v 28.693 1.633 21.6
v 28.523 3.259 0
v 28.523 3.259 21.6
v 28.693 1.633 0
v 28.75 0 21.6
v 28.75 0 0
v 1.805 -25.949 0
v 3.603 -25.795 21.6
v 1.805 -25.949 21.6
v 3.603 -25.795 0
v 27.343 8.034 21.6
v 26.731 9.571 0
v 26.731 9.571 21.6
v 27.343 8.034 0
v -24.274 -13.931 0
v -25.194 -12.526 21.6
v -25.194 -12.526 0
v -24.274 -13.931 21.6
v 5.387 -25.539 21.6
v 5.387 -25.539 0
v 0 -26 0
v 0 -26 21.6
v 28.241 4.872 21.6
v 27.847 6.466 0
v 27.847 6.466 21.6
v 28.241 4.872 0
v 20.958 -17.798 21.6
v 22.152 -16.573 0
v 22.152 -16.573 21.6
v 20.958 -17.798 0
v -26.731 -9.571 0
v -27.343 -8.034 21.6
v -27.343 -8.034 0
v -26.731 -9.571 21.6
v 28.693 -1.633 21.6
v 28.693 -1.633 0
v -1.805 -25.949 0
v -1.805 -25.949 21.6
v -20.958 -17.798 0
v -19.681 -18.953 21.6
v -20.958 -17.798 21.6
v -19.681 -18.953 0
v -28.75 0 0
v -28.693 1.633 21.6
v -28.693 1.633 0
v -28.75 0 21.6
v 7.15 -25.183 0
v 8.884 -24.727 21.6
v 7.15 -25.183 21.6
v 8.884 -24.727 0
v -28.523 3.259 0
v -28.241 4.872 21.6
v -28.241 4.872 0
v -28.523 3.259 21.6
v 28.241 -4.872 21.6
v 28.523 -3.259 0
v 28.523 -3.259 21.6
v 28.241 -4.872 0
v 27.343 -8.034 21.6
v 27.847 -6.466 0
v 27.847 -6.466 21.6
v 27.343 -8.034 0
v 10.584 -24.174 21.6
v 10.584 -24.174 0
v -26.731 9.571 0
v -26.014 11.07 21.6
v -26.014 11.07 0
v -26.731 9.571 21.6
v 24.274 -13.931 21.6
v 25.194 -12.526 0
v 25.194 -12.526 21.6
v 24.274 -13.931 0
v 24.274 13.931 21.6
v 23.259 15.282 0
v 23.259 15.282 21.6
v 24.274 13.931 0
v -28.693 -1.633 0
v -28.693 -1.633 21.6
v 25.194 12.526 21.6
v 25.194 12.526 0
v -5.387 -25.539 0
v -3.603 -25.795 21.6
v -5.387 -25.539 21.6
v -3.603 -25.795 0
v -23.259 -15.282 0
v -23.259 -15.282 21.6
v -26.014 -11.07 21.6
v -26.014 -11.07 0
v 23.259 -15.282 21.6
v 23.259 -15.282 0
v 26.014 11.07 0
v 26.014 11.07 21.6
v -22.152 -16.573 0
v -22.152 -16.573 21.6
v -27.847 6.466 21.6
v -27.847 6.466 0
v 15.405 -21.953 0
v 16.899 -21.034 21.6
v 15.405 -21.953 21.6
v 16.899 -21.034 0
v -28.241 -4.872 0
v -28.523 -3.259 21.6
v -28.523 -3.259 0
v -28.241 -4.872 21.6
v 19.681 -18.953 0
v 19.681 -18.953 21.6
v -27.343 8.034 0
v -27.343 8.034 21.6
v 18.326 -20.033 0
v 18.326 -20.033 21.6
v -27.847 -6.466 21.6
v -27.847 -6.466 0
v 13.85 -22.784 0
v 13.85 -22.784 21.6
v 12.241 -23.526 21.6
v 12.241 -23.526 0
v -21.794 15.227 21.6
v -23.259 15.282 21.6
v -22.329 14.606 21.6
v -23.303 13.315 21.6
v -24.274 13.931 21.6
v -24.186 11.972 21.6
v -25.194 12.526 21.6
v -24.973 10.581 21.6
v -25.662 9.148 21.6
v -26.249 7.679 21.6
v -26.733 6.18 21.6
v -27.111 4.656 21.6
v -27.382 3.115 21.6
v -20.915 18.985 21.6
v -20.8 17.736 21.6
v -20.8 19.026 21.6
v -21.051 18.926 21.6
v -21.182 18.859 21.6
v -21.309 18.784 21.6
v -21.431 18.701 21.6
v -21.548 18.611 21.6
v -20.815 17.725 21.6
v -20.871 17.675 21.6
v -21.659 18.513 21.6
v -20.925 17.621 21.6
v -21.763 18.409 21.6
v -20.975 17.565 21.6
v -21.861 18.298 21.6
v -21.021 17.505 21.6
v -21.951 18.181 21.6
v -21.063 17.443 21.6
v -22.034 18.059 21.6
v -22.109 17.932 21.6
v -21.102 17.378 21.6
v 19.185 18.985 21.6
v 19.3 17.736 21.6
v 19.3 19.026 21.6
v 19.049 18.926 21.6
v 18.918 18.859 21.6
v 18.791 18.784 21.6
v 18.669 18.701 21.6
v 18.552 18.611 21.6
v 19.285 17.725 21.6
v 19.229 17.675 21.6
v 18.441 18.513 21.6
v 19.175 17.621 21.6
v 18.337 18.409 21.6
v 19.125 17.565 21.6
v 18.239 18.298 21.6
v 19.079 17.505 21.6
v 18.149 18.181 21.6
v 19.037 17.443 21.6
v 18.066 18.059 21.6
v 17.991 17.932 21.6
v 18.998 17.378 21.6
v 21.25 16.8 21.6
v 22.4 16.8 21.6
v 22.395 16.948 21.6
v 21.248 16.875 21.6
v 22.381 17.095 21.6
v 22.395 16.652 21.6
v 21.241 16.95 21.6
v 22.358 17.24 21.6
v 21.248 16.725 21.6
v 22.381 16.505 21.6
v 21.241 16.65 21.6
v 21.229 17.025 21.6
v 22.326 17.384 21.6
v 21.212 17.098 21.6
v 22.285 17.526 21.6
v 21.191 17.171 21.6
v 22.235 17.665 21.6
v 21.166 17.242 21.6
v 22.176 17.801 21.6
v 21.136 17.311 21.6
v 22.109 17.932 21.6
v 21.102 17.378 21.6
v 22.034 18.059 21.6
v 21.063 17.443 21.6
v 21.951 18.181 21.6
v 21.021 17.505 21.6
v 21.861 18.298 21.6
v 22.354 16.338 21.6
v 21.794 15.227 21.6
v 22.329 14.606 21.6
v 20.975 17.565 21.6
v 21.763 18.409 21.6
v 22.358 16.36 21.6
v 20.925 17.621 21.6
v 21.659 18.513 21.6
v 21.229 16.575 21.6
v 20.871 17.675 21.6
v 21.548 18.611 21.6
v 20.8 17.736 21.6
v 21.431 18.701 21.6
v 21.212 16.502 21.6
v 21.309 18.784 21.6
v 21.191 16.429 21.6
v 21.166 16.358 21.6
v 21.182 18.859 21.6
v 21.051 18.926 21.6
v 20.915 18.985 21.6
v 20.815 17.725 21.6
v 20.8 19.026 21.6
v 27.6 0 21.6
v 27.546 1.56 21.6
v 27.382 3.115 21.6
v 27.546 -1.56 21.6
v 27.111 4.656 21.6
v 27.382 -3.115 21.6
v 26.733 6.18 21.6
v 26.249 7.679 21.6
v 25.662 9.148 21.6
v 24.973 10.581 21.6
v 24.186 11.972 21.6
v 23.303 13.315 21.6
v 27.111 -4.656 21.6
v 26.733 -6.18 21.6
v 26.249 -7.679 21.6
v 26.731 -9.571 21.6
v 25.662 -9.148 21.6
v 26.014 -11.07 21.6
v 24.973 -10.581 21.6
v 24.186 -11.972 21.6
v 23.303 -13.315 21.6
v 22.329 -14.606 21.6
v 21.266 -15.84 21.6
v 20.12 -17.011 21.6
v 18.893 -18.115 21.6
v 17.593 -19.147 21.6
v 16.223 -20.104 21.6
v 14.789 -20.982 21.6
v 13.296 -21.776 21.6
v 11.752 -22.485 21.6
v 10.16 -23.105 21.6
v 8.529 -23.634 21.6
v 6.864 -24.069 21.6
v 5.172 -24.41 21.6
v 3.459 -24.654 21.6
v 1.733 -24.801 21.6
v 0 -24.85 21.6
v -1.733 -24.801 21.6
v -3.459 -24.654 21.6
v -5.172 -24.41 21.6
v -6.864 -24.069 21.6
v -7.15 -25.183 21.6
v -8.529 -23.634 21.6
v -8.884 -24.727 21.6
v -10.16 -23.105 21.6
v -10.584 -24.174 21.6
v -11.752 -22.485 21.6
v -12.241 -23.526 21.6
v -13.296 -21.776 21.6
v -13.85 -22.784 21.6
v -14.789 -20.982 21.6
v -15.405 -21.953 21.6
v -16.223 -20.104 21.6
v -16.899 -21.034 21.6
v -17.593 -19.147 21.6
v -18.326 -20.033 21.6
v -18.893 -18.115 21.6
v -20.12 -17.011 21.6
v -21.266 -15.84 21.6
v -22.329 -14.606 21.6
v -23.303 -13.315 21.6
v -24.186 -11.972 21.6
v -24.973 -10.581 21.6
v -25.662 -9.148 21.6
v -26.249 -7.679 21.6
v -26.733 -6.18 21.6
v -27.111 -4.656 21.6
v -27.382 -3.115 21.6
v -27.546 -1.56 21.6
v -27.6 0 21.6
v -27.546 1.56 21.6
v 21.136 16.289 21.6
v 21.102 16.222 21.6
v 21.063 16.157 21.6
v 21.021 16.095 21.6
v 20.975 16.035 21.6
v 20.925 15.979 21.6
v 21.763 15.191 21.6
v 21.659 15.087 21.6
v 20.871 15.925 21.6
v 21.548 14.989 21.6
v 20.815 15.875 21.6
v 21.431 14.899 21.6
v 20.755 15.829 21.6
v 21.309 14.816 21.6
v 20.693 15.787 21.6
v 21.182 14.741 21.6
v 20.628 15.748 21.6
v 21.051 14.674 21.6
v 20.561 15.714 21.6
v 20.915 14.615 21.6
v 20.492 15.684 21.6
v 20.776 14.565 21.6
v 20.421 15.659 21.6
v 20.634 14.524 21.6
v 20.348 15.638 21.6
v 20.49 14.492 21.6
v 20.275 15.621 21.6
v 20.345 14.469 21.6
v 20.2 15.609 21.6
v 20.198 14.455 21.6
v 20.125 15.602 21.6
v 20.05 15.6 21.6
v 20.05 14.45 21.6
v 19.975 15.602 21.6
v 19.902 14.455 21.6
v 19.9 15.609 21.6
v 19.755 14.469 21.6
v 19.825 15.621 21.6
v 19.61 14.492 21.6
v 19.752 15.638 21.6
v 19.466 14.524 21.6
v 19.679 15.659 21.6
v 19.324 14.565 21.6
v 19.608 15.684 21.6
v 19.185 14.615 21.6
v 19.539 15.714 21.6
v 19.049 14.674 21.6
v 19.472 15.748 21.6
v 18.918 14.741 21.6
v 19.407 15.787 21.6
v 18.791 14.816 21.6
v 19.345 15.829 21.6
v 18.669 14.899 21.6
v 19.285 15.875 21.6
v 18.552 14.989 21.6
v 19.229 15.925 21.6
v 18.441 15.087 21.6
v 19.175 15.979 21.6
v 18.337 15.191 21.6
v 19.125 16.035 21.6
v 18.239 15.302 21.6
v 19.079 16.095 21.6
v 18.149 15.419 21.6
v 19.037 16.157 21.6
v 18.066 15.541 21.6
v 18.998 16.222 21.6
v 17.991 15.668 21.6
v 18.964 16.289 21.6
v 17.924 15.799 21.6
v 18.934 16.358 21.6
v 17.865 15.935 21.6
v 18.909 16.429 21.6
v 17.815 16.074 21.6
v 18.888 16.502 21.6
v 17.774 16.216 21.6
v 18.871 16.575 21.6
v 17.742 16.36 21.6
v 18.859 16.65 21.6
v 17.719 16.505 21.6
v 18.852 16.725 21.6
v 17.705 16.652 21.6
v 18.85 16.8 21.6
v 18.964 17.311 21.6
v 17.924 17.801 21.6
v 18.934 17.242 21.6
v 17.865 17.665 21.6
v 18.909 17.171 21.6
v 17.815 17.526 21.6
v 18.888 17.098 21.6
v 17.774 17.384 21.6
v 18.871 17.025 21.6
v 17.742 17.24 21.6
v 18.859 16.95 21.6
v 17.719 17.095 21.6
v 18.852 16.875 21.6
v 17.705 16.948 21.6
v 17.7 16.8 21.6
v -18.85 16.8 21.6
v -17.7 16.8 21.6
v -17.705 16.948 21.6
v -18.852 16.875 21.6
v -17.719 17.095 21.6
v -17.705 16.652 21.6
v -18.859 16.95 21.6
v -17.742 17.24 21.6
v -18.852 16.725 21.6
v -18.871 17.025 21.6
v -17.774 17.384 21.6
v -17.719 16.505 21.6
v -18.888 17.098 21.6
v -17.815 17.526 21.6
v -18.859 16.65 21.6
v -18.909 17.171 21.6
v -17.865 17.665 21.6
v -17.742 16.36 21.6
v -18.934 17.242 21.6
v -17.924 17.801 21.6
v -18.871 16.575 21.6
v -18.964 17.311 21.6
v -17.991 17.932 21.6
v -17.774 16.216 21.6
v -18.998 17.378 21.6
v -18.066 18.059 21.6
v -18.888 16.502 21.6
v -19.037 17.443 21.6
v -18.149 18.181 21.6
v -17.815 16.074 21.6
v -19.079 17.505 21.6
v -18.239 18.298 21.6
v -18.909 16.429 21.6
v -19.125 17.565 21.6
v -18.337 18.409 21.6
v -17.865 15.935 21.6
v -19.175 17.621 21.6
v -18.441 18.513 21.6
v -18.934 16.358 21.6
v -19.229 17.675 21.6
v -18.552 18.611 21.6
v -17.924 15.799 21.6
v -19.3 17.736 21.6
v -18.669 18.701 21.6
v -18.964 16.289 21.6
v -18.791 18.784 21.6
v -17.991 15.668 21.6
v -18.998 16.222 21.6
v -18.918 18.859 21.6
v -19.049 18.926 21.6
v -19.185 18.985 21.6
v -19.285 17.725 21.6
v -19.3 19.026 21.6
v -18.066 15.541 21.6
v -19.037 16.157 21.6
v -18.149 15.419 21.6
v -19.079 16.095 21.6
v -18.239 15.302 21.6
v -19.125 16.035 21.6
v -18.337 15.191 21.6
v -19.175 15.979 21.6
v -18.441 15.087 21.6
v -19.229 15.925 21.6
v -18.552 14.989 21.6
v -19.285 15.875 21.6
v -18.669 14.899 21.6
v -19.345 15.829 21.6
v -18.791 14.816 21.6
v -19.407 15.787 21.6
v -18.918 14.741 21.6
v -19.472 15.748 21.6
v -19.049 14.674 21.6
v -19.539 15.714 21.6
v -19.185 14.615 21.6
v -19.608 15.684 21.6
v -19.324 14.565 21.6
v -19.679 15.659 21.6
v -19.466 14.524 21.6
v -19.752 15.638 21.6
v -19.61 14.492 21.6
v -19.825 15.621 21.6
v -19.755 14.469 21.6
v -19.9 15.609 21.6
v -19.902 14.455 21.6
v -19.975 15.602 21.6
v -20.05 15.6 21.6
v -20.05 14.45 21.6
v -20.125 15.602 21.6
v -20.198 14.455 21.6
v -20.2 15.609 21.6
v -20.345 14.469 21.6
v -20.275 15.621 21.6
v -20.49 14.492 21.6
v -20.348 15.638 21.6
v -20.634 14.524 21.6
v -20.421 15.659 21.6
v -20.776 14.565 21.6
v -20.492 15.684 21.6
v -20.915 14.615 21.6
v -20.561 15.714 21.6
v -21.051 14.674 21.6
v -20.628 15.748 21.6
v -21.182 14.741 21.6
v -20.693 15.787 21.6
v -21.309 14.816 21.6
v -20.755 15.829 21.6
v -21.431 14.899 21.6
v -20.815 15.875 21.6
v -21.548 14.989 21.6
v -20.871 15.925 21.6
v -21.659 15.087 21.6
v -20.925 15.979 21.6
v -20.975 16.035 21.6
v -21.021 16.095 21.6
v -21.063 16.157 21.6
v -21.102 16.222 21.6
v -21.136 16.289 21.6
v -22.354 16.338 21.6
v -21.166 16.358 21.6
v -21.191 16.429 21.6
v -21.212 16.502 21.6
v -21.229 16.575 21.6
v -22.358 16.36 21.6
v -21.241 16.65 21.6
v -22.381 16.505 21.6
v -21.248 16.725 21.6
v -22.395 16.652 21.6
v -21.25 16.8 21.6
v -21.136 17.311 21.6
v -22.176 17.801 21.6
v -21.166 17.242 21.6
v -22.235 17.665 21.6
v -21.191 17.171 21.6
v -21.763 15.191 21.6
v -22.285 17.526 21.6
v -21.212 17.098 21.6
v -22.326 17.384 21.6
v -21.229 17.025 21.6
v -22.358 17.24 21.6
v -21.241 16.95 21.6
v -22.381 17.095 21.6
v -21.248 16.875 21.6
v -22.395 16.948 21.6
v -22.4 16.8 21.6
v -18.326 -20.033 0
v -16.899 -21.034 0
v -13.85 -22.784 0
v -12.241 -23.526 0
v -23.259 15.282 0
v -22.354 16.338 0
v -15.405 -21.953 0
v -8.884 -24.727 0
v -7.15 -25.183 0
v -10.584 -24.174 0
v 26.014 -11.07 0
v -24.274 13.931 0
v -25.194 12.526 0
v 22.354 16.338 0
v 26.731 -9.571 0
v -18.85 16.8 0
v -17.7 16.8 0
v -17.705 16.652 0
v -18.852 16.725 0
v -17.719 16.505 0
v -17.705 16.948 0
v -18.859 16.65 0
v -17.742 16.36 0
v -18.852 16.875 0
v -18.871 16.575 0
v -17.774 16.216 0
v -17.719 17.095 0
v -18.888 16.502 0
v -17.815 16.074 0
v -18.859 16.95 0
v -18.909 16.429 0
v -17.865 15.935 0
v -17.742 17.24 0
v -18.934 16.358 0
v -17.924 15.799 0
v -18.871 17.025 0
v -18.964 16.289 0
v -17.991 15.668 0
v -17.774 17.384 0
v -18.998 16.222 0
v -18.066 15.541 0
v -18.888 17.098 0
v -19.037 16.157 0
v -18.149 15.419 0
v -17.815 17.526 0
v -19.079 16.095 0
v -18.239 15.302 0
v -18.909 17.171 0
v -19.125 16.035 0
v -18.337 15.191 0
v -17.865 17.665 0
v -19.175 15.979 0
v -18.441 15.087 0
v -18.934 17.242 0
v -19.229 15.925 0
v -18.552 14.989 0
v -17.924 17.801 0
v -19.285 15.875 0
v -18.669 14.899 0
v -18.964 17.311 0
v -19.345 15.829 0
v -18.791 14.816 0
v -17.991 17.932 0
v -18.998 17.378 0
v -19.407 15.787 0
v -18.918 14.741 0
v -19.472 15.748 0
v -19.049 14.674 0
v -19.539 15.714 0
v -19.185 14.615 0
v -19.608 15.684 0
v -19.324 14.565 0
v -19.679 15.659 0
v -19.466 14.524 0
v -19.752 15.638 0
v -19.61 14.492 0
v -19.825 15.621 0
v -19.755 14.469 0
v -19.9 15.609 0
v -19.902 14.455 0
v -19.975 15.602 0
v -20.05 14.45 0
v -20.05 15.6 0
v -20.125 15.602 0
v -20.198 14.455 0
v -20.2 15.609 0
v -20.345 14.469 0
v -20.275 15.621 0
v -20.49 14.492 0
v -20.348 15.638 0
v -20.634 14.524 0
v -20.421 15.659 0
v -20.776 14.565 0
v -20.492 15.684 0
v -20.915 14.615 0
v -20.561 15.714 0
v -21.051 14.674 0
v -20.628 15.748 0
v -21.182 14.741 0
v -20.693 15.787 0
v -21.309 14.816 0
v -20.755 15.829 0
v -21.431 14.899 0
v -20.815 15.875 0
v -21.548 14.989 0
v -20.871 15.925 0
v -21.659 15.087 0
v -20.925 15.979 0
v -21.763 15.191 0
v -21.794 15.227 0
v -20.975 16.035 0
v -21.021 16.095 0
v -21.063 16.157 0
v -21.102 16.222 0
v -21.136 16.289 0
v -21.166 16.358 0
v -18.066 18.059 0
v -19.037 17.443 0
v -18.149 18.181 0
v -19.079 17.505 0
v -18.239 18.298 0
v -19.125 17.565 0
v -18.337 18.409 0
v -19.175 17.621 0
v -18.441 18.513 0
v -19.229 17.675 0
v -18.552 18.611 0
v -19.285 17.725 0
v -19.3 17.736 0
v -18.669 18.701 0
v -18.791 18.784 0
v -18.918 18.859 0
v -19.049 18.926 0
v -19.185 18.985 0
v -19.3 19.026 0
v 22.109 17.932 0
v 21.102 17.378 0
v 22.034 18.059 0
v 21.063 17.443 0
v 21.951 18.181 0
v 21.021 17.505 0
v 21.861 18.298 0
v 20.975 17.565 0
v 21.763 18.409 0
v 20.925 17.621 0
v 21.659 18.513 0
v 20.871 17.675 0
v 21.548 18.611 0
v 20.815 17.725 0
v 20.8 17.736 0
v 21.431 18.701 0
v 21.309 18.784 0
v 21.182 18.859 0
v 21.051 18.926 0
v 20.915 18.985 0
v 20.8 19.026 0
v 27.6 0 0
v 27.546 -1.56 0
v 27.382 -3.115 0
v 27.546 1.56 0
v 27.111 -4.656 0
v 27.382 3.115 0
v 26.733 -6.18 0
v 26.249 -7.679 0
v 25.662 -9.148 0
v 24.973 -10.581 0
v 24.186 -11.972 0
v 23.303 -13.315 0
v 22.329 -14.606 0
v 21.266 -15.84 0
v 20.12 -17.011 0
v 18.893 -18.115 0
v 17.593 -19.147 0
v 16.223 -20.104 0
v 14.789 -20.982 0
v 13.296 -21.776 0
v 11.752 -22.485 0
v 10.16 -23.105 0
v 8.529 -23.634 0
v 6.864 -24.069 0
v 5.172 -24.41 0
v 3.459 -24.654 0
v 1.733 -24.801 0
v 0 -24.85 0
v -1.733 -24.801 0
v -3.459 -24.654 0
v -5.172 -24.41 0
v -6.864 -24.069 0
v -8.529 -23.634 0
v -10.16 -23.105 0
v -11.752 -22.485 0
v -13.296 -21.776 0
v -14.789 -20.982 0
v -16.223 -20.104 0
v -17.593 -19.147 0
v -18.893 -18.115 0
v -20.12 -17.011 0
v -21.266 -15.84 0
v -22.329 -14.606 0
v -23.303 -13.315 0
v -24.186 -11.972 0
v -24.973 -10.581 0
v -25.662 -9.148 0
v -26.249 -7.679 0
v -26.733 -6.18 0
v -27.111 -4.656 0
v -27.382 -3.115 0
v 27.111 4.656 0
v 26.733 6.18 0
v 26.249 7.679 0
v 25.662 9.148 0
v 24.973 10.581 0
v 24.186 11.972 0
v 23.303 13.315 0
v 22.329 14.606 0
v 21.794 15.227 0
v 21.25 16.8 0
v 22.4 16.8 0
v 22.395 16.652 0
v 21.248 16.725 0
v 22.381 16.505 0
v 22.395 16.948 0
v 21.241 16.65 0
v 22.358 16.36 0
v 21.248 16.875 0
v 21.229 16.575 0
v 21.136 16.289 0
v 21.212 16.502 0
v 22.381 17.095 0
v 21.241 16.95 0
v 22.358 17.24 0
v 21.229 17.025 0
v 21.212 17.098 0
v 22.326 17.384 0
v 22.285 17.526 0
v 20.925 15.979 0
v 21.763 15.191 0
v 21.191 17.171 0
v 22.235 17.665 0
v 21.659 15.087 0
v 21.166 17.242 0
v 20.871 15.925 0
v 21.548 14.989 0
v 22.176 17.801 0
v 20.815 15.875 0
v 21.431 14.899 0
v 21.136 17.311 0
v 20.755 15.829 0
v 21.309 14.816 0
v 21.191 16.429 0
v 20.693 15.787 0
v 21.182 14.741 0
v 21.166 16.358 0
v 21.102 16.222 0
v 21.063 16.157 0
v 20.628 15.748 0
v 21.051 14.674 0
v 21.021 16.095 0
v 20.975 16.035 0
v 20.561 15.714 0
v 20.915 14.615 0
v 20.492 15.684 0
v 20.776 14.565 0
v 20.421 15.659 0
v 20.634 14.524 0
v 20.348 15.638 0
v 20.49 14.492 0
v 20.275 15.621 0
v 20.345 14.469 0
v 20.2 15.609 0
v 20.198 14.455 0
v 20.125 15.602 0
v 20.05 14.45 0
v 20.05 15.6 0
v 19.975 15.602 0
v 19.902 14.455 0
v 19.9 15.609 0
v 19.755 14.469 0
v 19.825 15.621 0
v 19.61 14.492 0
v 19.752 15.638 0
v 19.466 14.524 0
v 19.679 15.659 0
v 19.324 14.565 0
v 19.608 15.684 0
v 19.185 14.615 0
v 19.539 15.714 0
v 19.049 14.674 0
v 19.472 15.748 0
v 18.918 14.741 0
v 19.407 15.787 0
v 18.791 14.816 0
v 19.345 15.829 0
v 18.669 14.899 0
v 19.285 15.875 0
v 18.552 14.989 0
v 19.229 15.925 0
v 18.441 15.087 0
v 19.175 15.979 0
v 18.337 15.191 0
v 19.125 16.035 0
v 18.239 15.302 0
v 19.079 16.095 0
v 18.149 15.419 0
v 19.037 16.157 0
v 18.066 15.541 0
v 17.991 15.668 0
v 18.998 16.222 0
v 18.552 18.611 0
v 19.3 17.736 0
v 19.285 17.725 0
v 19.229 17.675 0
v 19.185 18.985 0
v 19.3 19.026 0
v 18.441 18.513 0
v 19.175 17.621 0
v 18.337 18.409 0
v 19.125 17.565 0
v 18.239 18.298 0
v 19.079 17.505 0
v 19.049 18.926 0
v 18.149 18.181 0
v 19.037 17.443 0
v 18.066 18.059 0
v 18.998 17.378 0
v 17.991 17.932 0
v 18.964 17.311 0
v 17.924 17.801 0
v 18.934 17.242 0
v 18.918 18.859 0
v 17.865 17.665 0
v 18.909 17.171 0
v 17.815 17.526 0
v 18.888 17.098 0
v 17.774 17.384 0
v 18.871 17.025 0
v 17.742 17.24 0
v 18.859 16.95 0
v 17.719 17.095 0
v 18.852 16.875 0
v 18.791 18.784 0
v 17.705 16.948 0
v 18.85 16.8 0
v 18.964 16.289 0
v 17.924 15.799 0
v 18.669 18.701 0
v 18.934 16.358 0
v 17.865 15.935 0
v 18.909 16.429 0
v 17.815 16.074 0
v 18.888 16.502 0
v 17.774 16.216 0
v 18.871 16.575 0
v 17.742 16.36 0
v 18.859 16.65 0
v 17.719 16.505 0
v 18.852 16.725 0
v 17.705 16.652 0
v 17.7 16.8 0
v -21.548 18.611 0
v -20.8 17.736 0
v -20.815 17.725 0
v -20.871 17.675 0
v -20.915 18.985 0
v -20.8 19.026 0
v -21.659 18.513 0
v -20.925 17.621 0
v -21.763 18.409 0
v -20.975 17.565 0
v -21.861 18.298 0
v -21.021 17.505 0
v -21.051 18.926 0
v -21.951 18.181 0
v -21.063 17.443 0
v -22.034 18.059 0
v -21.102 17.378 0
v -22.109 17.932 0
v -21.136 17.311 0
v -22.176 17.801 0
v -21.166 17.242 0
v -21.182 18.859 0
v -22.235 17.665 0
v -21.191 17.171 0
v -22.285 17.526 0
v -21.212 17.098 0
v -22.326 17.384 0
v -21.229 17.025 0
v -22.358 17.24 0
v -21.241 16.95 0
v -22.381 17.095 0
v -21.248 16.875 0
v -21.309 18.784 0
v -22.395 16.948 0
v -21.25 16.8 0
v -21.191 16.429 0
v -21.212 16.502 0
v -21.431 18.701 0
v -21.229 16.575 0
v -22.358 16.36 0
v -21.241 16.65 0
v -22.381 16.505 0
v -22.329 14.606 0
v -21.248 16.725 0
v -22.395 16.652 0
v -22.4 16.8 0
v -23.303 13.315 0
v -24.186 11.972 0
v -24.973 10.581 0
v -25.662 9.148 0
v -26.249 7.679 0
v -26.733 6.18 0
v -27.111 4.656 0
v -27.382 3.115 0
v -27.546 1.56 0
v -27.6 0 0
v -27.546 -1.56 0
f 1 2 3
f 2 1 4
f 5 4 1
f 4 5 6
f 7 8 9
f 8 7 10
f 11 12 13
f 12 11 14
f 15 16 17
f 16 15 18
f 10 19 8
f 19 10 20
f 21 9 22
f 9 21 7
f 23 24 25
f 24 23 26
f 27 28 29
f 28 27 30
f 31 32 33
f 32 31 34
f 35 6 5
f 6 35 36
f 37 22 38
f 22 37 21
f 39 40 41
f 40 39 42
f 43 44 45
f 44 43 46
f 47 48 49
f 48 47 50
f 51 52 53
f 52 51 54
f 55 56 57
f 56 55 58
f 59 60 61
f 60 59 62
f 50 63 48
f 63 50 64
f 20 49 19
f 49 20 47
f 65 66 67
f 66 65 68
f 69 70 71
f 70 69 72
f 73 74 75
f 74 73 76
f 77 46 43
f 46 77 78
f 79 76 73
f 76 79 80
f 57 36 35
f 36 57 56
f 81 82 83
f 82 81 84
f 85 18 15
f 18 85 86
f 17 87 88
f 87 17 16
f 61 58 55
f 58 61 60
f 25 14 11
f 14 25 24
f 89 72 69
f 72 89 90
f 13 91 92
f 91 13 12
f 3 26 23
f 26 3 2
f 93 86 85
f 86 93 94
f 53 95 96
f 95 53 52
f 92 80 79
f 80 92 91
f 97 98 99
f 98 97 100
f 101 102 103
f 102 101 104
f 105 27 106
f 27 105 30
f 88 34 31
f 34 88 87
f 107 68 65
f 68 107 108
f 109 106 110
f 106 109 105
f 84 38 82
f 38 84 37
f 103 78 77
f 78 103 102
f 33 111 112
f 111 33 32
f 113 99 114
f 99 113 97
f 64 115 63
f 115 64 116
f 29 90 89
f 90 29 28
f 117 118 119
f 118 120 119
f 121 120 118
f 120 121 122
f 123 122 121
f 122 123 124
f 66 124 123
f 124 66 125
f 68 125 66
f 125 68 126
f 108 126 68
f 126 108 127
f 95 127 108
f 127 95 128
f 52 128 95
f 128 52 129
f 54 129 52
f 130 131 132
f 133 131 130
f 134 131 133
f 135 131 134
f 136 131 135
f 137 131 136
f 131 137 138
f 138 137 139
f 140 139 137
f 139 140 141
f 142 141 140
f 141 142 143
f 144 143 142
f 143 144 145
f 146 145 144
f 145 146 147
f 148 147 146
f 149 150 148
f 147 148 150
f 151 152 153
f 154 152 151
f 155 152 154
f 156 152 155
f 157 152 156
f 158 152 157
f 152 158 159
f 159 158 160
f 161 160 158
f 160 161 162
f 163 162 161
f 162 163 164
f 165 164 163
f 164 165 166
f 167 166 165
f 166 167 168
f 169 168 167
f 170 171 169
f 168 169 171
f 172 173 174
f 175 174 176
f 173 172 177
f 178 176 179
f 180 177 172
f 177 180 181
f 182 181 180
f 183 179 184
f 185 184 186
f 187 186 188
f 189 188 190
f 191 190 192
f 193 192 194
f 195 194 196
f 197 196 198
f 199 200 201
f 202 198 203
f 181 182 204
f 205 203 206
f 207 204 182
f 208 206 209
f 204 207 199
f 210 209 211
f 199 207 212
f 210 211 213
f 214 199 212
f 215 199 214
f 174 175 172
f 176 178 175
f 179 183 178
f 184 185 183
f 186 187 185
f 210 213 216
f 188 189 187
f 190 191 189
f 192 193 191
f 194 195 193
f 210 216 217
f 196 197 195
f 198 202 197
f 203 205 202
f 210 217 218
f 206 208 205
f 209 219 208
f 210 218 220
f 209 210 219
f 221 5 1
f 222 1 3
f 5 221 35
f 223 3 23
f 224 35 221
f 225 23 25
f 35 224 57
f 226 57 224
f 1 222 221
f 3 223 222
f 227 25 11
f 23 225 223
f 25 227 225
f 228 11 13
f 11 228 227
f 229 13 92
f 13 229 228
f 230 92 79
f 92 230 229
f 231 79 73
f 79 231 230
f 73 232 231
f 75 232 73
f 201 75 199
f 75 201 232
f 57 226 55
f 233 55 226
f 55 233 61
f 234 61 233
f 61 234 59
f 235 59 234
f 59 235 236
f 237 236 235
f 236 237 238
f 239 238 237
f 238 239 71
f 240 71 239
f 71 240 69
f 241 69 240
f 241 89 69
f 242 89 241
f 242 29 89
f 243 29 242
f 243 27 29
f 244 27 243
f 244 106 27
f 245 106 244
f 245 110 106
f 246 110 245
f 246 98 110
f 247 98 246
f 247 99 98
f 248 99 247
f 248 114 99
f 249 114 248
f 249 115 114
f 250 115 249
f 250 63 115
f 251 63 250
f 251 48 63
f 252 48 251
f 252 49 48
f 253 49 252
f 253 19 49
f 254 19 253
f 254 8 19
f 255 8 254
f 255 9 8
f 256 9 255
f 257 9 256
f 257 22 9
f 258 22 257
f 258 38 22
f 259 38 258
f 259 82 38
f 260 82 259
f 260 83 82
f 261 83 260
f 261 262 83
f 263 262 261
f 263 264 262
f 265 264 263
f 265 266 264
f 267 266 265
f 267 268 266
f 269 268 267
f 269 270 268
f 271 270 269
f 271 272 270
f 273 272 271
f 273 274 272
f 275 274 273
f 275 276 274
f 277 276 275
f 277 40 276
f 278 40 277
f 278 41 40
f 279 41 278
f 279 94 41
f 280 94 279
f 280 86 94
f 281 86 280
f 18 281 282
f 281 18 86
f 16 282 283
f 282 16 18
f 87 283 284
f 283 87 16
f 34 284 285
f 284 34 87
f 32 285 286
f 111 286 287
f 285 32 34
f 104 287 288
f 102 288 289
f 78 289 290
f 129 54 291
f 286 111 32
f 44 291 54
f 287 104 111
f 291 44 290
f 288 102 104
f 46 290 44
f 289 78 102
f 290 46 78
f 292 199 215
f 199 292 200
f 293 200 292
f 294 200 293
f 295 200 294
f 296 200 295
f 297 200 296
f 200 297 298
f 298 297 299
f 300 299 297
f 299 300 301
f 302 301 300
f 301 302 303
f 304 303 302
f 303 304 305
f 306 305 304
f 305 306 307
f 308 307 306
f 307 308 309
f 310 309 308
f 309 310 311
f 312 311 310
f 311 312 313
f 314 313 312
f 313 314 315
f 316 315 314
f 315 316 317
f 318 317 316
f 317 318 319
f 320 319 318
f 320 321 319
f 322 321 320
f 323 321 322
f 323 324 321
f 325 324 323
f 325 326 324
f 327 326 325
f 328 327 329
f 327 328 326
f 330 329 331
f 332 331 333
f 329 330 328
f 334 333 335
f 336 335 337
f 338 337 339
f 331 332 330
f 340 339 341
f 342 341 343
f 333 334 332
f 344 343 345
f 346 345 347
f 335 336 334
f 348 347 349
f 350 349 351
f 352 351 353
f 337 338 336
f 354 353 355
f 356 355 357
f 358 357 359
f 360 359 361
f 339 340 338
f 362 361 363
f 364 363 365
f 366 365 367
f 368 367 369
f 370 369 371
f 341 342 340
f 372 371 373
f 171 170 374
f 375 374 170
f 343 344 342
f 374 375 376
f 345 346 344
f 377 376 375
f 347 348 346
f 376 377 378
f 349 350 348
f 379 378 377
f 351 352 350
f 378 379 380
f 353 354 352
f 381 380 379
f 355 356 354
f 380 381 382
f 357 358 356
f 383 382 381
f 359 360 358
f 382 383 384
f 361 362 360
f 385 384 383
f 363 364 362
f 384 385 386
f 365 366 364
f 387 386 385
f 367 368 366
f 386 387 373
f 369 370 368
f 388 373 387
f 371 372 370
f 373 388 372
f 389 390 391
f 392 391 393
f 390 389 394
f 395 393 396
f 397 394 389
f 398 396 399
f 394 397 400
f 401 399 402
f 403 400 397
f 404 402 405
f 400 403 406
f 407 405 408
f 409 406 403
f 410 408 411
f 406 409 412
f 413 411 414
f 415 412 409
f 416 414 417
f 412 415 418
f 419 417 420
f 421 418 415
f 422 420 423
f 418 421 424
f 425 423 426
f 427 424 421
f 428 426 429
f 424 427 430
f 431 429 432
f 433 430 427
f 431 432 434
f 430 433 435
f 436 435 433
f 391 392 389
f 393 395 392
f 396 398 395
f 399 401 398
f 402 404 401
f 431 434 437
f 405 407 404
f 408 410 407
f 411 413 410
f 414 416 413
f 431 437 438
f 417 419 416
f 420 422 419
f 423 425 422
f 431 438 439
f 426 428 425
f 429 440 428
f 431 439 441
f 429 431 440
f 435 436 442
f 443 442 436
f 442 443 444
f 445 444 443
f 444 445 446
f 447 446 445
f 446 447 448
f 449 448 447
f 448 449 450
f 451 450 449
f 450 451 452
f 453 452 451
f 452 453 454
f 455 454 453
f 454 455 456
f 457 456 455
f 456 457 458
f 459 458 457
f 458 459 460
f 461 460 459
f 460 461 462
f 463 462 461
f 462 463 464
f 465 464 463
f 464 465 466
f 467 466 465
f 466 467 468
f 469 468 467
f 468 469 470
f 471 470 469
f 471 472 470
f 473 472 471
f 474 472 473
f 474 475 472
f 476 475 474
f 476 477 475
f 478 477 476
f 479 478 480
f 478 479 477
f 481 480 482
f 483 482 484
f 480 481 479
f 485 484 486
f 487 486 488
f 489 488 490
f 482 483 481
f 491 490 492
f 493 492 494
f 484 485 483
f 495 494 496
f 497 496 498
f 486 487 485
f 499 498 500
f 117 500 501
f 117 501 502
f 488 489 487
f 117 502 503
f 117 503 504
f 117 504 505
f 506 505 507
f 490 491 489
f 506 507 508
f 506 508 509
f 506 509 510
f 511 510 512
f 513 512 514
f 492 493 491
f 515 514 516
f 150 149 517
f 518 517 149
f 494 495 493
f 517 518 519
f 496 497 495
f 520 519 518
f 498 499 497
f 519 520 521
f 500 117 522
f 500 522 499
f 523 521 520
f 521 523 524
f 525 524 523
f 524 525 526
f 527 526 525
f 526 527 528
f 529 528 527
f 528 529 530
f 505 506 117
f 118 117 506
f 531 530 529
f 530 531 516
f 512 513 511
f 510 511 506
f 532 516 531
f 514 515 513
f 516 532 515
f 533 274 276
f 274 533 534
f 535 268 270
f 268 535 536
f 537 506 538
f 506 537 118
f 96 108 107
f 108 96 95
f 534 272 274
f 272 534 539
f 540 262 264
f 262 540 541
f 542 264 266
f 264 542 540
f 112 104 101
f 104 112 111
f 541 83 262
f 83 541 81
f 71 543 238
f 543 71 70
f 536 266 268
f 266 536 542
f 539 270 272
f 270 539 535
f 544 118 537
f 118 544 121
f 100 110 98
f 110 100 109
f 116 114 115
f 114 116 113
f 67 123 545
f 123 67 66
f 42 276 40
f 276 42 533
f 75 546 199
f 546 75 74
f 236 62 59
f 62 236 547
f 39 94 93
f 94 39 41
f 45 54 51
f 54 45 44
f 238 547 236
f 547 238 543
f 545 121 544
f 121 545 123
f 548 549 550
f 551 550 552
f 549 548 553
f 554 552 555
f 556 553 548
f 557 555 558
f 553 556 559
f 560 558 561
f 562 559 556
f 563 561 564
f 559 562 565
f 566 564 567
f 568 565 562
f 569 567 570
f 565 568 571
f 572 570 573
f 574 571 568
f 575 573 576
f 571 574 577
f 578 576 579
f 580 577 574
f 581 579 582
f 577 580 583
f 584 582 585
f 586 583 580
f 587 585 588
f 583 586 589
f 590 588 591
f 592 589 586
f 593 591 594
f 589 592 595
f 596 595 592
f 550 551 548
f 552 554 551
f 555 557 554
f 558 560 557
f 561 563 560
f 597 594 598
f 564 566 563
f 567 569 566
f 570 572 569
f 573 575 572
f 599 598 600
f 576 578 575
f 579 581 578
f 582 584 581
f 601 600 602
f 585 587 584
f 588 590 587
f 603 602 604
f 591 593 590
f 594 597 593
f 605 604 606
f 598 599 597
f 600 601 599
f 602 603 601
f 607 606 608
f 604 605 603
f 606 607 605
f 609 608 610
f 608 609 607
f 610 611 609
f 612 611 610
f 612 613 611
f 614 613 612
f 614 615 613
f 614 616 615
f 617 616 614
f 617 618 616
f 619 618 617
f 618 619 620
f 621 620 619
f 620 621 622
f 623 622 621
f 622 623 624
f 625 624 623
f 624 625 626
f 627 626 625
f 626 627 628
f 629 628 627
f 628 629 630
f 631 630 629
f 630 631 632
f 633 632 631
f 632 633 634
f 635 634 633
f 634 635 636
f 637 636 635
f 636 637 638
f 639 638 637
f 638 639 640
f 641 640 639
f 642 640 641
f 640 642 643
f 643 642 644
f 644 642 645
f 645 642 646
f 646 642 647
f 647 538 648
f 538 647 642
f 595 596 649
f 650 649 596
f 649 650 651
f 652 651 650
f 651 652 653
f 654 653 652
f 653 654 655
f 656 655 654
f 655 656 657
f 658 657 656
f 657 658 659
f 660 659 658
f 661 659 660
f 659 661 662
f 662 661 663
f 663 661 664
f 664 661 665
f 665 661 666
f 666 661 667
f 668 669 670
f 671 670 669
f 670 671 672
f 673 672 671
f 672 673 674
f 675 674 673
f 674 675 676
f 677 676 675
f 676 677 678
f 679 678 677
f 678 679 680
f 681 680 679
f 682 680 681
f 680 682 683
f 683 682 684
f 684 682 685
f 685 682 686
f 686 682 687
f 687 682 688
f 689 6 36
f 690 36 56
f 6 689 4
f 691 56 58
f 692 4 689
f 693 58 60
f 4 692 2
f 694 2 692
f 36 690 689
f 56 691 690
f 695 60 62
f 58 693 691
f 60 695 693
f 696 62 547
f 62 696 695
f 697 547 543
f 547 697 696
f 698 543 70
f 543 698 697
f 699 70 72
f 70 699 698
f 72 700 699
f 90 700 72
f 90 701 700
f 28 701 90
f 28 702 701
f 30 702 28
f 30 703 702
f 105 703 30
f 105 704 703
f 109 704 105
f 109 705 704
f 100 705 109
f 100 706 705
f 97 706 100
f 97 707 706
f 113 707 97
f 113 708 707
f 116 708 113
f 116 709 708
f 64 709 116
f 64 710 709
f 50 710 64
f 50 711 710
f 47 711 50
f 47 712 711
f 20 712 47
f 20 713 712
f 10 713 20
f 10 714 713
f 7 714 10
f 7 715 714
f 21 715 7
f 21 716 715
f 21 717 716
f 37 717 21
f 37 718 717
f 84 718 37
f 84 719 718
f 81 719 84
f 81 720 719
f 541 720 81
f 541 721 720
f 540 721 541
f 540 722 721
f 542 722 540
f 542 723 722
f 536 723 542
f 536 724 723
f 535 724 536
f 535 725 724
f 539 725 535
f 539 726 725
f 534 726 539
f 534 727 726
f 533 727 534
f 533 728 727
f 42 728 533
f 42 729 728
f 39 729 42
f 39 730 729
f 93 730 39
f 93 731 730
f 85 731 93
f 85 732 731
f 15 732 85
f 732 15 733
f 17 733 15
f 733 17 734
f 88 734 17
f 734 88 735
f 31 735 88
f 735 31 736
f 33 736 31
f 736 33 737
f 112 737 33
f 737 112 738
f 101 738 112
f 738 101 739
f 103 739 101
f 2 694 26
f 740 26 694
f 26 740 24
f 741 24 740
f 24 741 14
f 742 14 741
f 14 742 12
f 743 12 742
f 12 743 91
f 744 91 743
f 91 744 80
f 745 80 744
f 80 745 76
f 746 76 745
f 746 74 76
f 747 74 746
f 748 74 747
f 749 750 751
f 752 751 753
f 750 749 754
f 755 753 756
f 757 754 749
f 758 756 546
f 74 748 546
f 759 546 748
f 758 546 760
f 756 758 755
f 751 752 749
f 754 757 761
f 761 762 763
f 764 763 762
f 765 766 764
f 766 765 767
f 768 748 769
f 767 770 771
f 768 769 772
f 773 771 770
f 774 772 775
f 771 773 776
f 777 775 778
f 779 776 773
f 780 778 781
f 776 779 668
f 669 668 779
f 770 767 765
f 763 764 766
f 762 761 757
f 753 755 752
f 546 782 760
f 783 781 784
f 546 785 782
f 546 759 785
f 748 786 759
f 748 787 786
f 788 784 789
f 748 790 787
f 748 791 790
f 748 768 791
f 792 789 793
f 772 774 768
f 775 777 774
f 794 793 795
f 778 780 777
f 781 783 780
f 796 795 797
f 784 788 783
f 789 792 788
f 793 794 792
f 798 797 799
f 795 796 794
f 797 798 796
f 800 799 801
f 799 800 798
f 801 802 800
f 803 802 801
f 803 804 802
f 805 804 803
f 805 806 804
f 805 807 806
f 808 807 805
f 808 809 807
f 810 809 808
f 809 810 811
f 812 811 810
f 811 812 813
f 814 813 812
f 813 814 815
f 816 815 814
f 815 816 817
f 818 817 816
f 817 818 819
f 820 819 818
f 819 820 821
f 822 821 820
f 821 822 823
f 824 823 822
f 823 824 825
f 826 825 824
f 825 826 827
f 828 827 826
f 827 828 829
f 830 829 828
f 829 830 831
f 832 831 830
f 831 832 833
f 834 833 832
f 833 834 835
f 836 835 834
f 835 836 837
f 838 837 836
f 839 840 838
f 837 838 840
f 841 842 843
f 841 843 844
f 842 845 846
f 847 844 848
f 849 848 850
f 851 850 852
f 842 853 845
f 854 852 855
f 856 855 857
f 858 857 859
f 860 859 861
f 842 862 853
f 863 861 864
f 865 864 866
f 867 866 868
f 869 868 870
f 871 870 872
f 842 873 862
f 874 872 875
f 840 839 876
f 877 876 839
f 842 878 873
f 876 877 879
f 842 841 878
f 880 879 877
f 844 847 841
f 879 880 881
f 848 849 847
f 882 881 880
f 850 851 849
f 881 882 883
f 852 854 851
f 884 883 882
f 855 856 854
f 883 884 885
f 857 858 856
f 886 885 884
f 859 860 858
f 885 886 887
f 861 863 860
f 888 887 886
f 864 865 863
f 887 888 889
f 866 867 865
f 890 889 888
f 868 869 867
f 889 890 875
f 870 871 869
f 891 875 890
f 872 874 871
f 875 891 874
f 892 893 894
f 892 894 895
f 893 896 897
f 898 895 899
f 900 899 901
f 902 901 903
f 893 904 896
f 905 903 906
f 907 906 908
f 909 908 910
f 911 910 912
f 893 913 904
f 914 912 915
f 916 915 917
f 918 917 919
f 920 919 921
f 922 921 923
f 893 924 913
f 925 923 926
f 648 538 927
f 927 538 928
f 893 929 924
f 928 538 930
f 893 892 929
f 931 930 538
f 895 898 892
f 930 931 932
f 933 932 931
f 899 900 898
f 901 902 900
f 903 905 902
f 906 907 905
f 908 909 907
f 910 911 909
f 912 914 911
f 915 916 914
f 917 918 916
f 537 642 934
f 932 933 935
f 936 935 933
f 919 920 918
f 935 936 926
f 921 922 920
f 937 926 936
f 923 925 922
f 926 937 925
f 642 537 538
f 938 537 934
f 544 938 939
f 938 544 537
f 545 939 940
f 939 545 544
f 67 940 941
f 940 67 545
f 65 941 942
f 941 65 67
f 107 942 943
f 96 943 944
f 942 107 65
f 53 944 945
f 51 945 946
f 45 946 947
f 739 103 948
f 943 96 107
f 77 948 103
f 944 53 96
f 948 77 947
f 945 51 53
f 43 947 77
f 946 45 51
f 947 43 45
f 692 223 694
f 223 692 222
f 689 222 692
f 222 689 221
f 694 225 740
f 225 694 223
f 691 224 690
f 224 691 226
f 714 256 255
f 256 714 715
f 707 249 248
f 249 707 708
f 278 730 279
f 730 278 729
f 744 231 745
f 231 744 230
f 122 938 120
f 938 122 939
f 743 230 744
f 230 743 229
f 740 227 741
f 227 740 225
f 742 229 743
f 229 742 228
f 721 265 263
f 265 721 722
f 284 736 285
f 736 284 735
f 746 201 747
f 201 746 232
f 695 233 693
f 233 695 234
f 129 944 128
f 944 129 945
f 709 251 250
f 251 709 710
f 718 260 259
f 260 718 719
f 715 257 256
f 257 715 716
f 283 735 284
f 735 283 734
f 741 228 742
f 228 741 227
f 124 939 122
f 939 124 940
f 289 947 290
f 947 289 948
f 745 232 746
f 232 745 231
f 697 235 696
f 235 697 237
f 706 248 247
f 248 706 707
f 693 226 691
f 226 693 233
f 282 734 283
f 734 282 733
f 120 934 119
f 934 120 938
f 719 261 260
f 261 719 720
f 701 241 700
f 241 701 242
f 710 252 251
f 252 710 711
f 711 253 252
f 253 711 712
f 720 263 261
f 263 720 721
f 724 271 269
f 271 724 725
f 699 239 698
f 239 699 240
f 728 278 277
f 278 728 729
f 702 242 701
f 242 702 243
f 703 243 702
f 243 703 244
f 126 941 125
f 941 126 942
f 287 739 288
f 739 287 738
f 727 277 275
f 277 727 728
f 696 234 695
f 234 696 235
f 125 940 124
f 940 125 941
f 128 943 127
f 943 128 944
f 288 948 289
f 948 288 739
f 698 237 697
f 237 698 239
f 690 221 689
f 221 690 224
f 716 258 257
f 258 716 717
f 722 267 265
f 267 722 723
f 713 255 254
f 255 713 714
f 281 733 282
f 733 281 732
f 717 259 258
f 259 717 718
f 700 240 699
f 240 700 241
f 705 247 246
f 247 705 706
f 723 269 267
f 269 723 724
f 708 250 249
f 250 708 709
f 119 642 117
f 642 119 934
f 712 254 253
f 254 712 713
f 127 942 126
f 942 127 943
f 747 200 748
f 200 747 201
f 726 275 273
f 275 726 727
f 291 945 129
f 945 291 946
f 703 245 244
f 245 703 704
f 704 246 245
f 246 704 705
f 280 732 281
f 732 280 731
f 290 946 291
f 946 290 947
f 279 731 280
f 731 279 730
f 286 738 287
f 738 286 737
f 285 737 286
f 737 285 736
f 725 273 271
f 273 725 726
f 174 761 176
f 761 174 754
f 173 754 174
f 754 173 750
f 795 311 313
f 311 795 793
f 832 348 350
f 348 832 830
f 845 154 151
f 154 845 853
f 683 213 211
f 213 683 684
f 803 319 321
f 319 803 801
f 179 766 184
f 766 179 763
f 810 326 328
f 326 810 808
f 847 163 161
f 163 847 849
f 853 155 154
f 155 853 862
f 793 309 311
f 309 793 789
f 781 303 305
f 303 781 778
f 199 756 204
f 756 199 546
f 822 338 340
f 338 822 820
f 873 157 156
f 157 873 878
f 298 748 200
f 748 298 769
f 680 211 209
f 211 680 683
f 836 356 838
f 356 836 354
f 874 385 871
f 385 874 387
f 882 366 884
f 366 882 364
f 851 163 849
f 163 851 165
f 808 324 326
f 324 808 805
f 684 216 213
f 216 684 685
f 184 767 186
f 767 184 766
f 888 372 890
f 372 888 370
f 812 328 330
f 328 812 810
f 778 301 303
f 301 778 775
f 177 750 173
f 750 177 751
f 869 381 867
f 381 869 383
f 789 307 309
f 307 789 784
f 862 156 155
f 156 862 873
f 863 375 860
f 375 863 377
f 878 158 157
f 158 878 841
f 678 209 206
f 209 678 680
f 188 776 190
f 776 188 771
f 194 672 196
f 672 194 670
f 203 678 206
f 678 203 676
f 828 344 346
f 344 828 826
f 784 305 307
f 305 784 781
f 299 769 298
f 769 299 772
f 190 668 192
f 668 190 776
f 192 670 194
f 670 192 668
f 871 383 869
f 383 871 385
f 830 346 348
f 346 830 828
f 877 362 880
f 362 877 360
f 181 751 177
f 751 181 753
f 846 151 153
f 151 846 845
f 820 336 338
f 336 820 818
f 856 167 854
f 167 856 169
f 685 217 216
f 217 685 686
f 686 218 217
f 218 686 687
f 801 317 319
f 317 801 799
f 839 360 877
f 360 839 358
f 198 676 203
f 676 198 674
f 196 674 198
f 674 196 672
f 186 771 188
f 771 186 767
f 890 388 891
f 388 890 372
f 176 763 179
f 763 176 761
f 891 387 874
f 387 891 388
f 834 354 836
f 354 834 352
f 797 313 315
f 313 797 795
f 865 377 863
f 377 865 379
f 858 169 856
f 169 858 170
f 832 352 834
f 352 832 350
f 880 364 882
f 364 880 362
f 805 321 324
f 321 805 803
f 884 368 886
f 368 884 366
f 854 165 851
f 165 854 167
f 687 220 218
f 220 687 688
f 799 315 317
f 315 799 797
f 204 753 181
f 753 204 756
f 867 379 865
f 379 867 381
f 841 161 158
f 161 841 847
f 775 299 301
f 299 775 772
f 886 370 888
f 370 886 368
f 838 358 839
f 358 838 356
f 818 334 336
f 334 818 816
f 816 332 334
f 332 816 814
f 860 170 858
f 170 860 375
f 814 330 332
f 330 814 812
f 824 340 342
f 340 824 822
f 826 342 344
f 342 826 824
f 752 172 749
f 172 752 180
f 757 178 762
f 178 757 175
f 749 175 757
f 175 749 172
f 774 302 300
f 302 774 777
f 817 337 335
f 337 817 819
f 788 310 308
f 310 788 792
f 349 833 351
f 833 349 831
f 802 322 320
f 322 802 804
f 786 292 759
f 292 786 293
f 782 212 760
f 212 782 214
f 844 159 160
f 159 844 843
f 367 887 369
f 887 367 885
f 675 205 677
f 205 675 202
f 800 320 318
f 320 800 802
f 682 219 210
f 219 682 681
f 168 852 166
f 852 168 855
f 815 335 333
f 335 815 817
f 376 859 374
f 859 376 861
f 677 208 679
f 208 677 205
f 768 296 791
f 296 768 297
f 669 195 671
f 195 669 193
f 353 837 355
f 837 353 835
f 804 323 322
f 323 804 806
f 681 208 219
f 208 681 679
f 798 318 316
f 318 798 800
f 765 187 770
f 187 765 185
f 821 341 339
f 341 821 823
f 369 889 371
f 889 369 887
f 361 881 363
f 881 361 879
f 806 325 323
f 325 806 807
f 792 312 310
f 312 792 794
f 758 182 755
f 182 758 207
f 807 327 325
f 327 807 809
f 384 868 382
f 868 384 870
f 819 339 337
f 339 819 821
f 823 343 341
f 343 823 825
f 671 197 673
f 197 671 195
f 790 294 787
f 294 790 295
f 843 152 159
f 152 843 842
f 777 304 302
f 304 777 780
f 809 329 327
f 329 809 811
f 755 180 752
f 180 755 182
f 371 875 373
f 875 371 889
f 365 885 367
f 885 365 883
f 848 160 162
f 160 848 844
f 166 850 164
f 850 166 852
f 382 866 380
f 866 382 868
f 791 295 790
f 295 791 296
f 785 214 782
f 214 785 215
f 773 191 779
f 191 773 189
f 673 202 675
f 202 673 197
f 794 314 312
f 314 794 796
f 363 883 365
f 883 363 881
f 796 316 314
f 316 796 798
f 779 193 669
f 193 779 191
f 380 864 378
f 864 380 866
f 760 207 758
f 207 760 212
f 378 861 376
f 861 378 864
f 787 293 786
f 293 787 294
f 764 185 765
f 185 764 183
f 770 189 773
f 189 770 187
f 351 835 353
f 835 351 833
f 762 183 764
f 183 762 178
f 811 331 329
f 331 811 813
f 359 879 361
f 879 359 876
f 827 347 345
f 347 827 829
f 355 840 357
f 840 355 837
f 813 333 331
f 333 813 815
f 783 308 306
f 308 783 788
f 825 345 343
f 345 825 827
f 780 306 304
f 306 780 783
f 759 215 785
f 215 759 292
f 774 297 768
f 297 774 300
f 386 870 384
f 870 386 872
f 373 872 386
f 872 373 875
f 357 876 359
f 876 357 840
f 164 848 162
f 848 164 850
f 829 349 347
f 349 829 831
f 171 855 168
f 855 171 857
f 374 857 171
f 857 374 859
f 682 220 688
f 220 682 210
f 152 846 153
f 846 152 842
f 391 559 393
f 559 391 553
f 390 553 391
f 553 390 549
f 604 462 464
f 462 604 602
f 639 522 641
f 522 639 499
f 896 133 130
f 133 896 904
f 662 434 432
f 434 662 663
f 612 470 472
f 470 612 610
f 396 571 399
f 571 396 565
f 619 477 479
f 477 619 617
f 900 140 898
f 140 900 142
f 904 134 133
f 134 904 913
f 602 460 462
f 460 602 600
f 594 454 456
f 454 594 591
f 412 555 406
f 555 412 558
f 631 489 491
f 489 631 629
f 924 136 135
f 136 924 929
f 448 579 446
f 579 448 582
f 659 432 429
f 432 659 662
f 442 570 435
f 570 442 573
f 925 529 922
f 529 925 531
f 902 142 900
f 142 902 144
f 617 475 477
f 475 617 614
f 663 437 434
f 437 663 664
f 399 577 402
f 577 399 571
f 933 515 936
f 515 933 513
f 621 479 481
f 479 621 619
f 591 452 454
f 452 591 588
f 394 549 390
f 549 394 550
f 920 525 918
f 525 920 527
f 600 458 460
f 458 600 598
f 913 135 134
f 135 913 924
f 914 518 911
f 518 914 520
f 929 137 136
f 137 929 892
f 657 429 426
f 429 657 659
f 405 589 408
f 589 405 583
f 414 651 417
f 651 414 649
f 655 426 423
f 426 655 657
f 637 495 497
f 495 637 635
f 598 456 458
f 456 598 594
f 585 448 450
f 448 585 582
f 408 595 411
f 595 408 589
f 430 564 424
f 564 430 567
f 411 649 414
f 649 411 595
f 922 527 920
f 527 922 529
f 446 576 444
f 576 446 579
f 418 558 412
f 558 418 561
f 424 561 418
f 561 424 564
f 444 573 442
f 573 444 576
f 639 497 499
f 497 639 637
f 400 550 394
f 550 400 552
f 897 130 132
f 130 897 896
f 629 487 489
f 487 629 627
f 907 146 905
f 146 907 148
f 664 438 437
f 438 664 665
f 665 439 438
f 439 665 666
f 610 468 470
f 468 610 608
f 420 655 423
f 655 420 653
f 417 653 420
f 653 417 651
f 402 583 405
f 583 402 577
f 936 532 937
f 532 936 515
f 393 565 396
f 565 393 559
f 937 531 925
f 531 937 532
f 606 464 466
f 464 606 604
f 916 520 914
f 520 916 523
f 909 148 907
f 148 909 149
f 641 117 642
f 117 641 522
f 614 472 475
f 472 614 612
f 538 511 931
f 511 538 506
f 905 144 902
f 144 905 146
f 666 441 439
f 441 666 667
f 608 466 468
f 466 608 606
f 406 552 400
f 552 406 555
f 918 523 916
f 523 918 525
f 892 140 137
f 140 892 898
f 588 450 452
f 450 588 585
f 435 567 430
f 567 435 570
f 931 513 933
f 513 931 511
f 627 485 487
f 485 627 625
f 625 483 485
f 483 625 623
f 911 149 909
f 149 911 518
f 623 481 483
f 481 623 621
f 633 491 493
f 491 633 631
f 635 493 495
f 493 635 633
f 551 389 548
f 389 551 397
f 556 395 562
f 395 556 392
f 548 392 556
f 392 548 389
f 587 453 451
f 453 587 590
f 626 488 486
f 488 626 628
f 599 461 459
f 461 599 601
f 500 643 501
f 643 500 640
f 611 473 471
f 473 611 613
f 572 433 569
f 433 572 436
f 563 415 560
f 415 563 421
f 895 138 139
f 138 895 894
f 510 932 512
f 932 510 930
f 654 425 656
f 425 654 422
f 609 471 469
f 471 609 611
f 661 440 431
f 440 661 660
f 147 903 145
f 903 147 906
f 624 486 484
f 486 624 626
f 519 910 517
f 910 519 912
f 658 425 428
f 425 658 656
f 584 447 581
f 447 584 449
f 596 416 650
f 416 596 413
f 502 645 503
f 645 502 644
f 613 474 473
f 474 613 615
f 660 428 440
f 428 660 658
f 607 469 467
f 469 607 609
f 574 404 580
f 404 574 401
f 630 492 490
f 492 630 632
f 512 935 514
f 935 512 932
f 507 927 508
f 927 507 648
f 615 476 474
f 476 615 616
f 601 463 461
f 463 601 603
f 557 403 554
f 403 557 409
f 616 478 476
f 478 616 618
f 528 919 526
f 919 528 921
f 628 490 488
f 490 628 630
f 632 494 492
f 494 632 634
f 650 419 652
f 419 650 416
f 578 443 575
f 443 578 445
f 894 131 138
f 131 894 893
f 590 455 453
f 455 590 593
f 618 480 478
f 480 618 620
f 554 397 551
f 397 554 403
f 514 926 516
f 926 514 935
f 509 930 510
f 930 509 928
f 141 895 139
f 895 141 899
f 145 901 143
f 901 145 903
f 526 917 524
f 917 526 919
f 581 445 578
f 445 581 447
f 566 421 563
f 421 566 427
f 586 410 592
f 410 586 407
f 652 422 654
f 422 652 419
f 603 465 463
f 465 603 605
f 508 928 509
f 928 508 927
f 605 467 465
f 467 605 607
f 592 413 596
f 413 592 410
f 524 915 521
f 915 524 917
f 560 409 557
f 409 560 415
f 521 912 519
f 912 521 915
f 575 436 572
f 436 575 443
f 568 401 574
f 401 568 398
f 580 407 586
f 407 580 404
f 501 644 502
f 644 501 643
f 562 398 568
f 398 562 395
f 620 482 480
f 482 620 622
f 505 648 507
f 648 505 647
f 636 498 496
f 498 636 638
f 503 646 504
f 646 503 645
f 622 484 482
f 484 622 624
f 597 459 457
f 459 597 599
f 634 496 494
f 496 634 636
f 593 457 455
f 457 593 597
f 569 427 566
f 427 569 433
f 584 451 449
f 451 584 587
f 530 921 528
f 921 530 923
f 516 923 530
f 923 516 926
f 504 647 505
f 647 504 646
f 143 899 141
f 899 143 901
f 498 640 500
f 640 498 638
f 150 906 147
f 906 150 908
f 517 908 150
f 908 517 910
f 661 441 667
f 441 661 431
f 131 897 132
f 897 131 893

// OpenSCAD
/* [Global] */

// major radius
r_major = 28.75;

// minor radius
r_minor = 26;

// width of strap
s_width = 21.6;

// thickness of strap
thickness = 1.15;

/* [Hidden] */
$fn=100;

pin_r = 1.2; // pin radius

c_width = s_width+thickness;
pebble = [42.5,16,s_width+thickness];

module pin()
{
    difference()
    {
        cylinder(r=pin_r+thickness,h=s_width,center=true);
        cylinder(r=pin_r,h=c_width,center=true);
        translate([0,pin_r,0])
            cube([pin_r*1.25,pin_r*2,c_width],center=true);
    }
}

translate([0,0,s_width/2])
{
	difference()
	{
		resize([r_major*2,r_minor*2,0])
			cylinder(r=(r_major+r_minor)/2, h=s_width, center=true);
		resize([(r_major-thickness)*2,(r_minor-thickness)*2,0])
			cylinder(r=(r_major+r_minor)/2, h=c_width, center=true);
		translate([0,r_minor-pebble[1]/2,0]) cube(pebble,center=true);
	}
	
	for(i=[1,-1]) translate([i*(pebble[0]/2-pin_r),r_minor-pebble[1]/2-pin_r,0]) pin();
}
